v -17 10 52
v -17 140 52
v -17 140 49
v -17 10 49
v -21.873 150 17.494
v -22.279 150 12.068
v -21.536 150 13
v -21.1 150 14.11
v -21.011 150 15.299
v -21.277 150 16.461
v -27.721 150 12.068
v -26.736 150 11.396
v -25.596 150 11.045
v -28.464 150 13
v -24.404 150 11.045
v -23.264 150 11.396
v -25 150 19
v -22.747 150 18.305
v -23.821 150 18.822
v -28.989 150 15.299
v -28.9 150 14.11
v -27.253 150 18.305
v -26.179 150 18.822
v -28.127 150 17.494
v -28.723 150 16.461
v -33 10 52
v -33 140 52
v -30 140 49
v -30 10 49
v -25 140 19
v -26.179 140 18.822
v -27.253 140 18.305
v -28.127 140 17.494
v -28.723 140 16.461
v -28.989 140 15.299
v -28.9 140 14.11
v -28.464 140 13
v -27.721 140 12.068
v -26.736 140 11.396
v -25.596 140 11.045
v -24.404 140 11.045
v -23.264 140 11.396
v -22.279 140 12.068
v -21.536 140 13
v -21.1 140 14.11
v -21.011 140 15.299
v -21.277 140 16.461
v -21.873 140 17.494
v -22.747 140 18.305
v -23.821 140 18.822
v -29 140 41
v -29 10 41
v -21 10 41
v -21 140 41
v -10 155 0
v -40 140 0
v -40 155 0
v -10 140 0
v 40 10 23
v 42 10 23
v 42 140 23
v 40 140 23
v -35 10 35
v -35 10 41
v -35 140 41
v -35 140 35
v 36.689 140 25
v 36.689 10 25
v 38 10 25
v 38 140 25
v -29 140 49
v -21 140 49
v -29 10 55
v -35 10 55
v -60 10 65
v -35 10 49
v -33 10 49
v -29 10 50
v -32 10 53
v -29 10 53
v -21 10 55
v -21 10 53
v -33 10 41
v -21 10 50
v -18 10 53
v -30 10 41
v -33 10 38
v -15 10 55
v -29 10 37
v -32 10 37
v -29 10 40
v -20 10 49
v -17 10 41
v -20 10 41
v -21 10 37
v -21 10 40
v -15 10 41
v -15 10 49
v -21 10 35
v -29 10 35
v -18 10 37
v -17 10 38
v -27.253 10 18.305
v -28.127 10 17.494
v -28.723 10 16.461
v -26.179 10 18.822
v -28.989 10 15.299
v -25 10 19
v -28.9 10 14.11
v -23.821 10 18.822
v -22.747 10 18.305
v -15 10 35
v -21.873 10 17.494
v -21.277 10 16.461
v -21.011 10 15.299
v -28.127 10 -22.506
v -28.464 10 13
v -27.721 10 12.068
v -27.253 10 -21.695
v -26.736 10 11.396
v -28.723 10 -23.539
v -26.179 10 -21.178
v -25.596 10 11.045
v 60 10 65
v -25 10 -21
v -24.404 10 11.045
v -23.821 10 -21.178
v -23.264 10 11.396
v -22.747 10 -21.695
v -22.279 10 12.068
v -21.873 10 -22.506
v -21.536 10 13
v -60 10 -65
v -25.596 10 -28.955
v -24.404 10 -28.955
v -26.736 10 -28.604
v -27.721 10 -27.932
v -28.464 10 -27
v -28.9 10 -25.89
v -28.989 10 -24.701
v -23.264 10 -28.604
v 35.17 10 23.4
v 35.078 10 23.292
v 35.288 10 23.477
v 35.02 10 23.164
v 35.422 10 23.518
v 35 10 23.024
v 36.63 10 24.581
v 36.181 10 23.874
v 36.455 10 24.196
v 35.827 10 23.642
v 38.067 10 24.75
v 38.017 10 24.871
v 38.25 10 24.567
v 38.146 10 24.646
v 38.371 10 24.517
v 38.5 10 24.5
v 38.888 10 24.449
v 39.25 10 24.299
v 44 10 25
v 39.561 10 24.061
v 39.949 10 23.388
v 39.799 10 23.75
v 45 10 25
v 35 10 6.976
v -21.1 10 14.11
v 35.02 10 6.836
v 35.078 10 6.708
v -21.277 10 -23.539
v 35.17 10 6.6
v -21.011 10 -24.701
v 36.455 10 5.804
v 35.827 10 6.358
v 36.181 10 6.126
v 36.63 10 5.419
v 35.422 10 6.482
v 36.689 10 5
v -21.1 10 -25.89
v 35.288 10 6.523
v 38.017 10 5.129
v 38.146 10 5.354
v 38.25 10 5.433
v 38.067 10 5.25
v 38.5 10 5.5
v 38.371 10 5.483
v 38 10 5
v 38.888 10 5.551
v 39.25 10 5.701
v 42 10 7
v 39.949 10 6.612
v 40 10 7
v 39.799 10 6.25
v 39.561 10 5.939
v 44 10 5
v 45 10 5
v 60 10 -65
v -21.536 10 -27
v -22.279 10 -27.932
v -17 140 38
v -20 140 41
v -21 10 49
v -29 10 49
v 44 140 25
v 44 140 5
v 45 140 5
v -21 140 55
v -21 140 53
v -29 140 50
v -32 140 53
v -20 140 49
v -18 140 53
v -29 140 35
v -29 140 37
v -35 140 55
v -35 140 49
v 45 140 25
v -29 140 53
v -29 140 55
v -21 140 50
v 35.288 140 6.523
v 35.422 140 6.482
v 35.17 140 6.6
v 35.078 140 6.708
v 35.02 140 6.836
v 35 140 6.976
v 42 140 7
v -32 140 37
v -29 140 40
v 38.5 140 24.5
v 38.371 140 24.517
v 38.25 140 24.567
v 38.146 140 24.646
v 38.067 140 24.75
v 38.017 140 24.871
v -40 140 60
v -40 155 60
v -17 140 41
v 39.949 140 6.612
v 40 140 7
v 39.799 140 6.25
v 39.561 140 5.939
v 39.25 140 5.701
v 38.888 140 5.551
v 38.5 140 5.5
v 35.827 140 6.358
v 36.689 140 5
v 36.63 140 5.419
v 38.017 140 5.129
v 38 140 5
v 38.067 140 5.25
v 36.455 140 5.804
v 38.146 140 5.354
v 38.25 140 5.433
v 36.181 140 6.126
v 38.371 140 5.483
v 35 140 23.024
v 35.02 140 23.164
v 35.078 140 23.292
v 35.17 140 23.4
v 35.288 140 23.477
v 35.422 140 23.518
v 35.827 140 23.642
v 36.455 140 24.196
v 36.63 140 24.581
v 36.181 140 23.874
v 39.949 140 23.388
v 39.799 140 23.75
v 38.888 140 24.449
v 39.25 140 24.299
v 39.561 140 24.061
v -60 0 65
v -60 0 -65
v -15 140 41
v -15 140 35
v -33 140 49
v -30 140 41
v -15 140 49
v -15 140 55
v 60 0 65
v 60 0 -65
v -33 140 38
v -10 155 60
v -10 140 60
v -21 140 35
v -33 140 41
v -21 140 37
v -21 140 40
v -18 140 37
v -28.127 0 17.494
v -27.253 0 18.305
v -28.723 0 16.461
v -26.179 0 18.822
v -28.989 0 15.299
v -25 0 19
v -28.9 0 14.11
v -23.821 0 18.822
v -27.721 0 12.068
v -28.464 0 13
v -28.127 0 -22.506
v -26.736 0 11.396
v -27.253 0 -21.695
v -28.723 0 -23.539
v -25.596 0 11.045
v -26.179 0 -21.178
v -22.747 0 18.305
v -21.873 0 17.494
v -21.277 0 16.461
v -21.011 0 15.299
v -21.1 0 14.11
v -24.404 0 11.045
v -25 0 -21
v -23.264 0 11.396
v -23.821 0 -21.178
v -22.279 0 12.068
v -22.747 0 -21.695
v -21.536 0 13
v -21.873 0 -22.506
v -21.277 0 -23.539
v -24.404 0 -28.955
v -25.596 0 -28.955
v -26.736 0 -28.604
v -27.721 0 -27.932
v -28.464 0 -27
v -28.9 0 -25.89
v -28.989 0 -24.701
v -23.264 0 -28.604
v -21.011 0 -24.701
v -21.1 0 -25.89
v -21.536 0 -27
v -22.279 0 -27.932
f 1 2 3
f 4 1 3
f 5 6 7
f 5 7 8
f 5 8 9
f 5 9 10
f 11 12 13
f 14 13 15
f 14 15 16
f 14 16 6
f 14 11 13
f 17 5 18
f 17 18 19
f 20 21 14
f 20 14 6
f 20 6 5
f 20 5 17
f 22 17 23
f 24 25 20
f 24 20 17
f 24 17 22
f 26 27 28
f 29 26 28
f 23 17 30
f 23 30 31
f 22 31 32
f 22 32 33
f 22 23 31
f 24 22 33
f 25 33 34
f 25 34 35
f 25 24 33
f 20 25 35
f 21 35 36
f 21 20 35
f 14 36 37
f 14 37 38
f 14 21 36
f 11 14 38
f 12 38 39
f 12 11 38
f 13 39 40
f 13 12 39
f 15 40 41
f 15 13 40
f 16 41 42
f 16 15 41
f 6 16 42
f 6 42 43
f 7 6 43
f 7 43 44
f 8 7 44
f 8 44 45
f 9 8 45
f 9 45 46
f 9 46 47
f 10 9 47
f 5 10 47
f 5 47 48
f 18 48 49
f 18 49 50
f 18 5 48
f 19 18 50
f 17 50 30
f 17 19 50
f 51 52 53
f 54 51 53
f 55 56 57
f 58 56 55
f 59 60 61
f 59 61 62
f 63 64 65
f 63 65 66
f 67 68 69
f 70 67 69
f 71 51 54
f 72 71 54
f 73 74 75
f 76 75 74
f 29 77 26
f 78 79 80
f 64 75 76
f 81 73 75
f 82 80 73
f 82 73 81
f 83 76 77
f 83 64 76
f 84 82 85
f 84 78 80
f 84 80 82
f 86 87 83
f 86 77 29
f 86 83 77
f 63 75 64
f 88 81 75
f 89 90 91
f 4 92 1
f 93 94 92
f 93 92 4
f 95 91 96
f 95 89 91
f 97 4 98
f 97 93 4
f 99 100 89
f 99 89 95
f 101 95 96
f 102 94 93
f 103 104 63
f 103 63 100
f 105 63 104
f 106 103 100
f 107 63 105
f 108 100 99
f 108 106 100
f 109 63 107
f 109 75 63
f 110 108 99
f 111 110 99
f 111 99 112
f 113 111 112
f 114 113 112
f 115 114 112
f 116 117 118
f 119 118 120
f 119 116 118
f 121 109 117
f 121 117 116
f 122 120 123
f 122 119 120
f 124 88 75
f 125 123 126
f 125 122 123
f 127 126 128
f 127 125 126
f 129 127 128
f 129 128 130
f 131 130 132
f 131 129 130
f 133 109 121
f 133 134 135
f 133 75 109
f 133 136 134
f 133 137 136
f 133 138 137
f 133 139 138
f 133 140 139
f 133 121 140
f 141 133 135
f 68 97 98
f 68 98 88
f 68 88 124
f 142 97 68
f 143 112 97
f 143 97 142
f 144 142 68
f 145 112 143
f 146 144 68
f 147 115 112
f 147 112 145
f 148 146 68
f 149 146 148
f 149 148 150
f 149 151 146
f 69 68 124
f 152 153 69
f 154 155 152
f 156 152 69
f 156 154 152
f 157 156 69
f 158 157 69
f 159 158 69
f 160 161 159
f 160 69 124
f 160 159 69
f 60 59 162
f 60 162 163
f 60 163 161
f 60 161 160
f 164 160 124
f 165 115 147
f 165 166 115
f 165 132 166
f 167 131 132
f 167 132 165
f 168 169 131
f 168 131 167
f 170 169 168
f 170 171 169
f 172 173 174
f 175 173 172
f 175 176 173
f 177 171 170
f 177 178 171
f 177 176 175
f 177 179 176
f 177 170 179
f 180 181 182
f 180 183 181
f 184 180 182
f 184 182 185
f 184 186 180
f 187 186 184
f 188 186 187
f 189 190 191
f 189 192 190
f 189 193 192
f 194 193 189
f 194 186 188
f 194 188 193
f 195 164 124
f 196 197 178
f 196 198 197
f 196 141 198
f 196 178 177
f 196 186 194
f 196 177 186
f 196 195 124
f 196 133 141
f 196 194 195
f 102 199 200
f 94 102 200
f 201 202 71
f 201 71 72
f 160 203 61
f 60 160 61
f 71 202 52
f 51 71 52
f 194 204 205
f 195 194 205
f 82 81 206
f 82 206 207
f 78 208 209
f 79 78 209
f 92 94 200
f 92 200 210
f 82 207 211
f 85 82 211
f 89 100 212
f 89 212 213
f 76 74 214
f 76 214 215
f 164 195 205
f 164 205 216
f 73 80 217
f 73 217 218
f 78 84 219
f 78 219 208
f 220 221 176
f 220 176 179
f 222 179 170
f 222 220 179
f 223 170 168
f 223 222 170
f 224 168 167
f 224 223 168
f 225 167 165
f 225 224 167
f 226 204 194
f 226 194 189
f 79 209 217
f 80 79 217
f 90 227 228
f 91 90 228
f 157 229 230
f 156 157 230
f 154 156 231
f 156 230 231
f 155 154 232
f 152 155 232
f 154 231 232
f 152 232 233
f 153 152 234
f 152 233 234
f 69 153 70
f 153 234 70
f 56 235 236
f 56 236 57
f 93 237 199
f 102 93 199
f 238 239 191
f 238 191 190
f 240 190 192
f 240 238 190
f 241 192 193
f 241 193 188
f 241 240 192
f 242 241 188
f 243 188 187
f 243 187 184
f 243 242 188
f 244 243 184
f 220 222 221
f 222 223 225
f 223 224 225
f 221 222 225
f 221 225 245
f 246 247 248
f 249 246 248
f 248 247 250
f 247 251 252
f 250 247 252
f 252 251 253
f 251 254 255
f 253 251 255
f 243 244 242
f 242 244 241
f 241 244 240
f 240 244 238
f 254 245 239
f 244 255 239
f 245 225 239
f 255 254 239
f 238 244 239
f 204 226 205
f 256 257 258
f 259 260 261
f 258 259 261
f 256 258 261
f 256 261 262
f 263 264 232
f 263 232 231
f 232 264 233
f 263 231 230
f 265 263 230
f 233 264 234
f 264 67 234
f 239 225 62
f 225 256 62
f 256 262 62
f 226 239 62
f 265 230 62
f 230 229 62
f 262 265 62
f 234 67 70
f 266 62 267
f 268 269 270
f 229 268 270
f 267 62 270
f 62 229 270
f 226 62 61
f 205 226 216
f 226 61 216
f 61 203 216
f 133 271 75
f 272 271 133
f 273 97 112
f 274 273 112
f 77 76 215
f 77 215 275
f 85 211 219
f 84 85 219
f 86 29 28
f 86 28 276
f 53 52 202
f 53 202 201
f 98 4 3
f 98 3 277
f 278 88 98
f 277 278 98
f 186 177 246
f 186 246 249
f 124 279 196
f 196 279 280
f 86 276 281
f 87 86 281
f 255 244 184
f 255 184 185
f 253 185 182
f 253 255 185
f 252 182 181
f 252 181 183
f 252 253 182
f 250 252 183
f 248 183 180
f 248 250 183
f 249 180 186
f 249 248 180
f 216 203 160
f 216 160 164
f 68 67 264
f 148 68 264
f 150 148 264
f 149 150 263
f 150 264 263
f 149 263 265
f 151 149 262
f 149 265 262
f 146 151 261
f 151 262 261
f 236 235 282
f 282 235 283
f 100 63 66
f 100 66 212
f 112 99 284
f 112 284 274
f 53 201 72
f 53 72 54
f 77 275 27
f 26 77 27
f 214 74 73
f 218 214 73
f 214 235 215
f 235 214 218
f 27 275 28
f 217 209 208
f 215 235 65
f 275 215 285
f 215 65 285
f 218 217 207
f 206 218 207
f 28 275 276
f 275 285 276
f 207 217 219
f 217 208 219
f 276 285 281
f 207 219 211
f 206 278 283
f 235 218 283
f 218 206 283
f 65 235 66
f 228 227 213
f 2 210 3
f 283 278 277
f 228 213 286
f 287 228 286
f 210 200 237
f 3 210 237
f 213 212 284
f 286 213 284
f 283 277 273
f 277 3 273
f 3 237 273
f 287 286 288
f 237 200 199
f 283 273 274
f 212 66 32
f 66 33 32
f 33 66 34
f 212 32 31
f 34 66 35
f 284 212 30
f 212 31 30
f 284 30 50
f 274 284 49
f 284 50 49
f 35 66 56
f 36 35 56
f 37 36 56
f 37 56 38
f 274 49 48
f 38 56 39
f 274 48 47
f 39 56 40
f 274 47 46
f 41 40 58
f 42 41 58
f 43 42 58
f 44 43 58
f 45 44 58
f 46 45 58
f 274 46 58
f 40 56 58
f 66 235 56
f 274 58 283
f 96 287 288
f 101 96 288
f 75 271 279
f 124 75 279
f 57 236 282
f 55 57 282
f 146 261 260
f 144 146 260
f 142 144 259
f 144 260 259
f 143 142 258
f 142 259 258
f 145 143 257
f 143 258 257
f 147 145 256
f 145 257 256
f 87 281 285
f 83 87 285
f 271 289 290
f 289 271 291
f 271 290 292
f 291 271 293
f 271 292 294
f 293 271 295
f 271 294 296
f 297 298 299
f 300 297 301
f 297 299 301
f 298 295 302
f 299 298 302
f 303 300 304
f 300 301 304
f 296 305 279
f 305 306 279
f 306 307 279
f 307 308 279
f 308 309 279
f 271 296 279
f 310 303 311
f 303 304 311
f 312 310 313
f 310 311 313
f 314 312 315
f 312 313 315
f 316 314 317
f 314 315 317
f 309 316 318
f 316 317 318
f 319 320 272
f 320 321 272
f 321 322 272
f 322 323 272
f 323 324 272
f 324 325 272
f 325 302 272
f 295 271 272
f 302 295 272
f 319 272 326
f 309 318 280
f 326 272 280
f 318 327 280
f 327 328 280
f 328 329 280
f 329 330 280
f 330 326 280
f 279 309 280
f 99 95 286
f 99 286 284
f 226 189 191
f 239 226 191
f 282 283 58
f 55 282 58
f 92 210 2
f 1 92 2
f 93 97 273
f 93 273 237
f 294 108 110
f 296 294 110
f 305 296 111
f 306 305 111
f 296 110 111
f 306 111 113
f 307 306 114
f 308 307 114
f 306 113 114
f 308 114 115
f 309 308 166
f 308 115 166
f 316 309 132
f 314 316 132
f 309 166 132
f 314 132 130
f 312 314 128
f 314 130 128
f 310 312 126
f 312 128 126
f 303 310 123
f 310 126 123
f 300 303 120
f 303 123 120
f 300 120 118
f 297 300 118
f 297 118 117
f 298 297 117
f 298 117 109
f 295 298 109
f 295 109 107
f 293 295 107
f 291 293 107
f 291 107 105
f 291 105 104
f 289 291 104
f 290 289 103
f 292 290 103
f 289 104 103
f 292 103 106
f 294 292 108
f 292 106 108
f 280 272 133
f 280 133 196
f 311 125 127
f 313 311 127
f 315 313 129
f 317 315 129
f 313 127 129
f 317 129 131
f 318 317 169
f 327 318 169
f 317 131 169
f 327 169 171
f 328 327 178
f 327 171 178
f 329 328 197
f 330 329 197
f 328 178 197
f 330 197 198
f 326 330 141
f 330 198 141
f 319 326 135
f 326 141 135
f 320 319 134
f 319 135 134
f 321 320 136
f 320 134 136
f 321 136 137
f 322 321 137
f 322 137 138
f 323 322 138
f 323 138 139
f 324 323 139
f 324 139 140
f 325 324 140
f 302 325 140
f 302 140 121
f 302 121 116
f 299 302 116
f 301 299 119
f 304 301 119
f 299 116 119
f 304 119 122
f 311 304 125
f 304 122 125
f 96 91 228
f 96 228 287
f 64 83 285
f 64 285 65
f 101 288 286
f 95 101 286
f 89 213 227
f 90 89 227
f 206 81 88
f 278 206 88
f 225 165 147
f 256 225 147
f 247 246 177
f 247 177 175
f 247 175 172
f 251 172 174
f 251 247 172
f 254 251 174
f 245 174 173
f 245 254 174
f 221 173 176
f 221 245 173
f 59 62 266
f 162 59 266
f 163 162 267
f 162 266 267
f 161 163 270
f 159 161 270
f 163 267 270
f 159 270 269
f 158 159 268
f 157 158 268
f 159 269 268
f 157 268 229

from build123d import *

# Parameters (mm, degrees)
SKETCH1_W           = 120
SKETCH1_H           = 130
BASEMOUNT_DEPTH     = 10
SKETCH4_W           = 10
SKETCH4_H           = 10
BOSS_EXTRUDE3_DEPTH = 130
CUT_EXTRUDE2_DEPTH  = 130
SKETCH6_R           = 4
CUT_EXTRUDE3_DEPTH  = 10
SKETCH7_W           = 20
SKETCH7_H           = 20
FRONTBAR_DEPTH      = 130
SKETCH8_W           = 8
SKETCH8_H           = 8
CENTERCUT_DEPTH     = 130
SITECUTBASIC_DEPTH  = 130
SITECUTMIRROR_COUNT = 4
SKETCH11_W          = 30
SKETCH11_H          = 60
UPPERBODY_DEPTH     = 15
CUT_EXTRUDE6_START  = -10
SKETCH13_R          = 4
CUT_EXTRUDE6_DEPTH  = 10


with BuildPart() as part:
    # Sketch1 → BaseMount (new body)
    with BuildSketch(Plane(origin=(0, 0, 0), x_dir=(1, 0, 0), z_dir=(0, 1, 0))):
        Rectangle(SKETCH1_W, SKETCH1_H)
    extrude(amount=BASEMOUNT_DEPTH)


with BuildPart() as body_2:
    # Sketch4 → Boss-Extrude3 (new body)
    with BuildSketch(Plane(origin=(0, 10, 0), x_dir=(1, 0, 0), z_dir=(0, 1, 0))):
        with Locations((40, -10)):
            Rectangle(SKETCH4_W, SKETCH4_H)
    boss_extrude3 = extrude(amount=BOSS_EXTRUDE3_DEPTH)

    # Sketch5 → Cut-Extrude2 (cut)
    with BuildSketch(Plane(origin=(0, 140, 0), x_dir=(1, 0, 0), z_dir=(0, 1, 0))):
        with BuildLine():
            Line((44, -5), (42, -7))
            Line((42, -7), (40, -7))
            ThreePointArc((40, -7), (39.560660172, -5.939339828), (38.5, -5.5))
            ThreePointArc((38.5, -5.5), (38.146446609, -5.353553391), (38, -5))
            Line((38, -5), (44, -5))
        make_face()
        with BuildLine():
            Line((35, -6.975723129), (35, -5))
            Line((35, -5), (36.689326349, -5))
            ThreePointArc((36.689326349, -5), (36.32939386, -5.974805658), (35.422331587, -6.481792347))
            ThreePointArc((35.422331587, -6.481792347), (35.119977497, -6.65078791), (35, -6.975723129))
        make_face()
        Polygon((45, 3.687489646), (44.5, 4.249082756), (44.5, 5.24232749), (45, 5.687489646), align=None)
    cut_extrude2 = extrude(amount=-CUT_EXTRUDE2_DEPTH, mode=Mode.SUBTRACT)


with BuildPart() as part_1:
    add(part.part)

    add(body_2.part)  # Mirror9 merges body 2
    # Mirror9: Boss-Extrude3 across plane
    add(boss_extrude3.mirror(Plane(origin=(45, 140, 15), x_dir=(1, 0, 0), z_dir=(0, 0, -1))))

    # Mirror9 2: Cut-Extrude2 across plane
    add(cut_extrude2.mirror(Plane(origin=(45, 140, 15), x_dir=(1, 0, 0), z_dir=(0, 0, -1))), mode=Mode.SUBTRACT)

    # Sketch6 → Cut-Extrude3 (cut)
    with BuildSketch(Plane(origin=(0, 10, 0), x_dir=(1, 0, 0), z_dir=(0, 1, 0))):
        with Locations((-25, -15)):
            Circle(SKETCH6_R)
        with Locations((-25, 25)):
            Circle(SKETCH6_R)
    extrude(amount=-CUT_EXTRUDE3_DEPTH, mode=Mode.SUBTRACT)

    # Sketch7 → frontBar (add)
    with BuildSketch(Plane(origin=(0, 10, 0), x_dir=(1, 0, 0), z_dir=(0, 1, 0))):
        with Locations((-25, -45)):
            Rectangle(SKETCH7_W, SKETCH7_H)
    extrude(amount=FRONTBAR_DEPTH)

    # Sketch8 → centercut (cut)
    with BuildSketch(Plane(origin=(0, 140, 0), x_dir=(1, 0, 0), z_dir=(0, 1, 0))):
        with Locations((-25, -45)):
            Rectangle(SKETCH8_W, SKETCH8_H)
    extrude(amount=-CENTERCUT_DEPTH, mode=Mode.SUBTRACT)

    # Sketch10 → siteCutBasic (cut)
    with BuildSketch(Plane(origin=(0, 140, 0), x_dir=(1, 0, 0), z_dir=(0, 1, 0))):
        Polygon((-32, -53), (-29, -53), (-29, -55), (-21, -55), (-21, -53), (-18, -53), (-21, -50), (-29, -50), align=None)
    sitecutbasic = extrude(amount=-SITECUTBASIC_DEPTH, mode=Mode.SUBTRACT)

    # siteCutMirror: siteCutBasic ×4 about axis
    sitecutmirror_axis = Axis((-25, 10, 45), (0, 1, 0))
    for i in range(1, SITECUTMIRROR_COUNT):
        add(sitecutbasic.rotate(sitecutmirror_axis, i * 360 / SITECUTMIRROR_COUNT), mode=Mode.SUBTRACT)

    # Sketch11 → upperBody (add)
    with BuildSketch(Plane(origin=(0, 140, 0), x_dir=(1, 0, 0), z_dir=(0, 1, 0))):
        with Locations((-25, -30)):
            Rectangle(SKETCH11_W, SKETCH11_H)
    extrude(amount=UPPERBODY_DEPTH)

    # Sketch13 → Cut-Extrude6 (cut)
    with BuildSketch(Plane.XZ.offset(-140).offset(CUT_EXTRUDE6_START)):
        with Locations((-25, 15)):
            Circle(SKETCH13_R)
    extrude(amount=CUT_EXTRUDE6_DEPTH, mode=Mode.SUBTRACT)


solid = part_1.part
